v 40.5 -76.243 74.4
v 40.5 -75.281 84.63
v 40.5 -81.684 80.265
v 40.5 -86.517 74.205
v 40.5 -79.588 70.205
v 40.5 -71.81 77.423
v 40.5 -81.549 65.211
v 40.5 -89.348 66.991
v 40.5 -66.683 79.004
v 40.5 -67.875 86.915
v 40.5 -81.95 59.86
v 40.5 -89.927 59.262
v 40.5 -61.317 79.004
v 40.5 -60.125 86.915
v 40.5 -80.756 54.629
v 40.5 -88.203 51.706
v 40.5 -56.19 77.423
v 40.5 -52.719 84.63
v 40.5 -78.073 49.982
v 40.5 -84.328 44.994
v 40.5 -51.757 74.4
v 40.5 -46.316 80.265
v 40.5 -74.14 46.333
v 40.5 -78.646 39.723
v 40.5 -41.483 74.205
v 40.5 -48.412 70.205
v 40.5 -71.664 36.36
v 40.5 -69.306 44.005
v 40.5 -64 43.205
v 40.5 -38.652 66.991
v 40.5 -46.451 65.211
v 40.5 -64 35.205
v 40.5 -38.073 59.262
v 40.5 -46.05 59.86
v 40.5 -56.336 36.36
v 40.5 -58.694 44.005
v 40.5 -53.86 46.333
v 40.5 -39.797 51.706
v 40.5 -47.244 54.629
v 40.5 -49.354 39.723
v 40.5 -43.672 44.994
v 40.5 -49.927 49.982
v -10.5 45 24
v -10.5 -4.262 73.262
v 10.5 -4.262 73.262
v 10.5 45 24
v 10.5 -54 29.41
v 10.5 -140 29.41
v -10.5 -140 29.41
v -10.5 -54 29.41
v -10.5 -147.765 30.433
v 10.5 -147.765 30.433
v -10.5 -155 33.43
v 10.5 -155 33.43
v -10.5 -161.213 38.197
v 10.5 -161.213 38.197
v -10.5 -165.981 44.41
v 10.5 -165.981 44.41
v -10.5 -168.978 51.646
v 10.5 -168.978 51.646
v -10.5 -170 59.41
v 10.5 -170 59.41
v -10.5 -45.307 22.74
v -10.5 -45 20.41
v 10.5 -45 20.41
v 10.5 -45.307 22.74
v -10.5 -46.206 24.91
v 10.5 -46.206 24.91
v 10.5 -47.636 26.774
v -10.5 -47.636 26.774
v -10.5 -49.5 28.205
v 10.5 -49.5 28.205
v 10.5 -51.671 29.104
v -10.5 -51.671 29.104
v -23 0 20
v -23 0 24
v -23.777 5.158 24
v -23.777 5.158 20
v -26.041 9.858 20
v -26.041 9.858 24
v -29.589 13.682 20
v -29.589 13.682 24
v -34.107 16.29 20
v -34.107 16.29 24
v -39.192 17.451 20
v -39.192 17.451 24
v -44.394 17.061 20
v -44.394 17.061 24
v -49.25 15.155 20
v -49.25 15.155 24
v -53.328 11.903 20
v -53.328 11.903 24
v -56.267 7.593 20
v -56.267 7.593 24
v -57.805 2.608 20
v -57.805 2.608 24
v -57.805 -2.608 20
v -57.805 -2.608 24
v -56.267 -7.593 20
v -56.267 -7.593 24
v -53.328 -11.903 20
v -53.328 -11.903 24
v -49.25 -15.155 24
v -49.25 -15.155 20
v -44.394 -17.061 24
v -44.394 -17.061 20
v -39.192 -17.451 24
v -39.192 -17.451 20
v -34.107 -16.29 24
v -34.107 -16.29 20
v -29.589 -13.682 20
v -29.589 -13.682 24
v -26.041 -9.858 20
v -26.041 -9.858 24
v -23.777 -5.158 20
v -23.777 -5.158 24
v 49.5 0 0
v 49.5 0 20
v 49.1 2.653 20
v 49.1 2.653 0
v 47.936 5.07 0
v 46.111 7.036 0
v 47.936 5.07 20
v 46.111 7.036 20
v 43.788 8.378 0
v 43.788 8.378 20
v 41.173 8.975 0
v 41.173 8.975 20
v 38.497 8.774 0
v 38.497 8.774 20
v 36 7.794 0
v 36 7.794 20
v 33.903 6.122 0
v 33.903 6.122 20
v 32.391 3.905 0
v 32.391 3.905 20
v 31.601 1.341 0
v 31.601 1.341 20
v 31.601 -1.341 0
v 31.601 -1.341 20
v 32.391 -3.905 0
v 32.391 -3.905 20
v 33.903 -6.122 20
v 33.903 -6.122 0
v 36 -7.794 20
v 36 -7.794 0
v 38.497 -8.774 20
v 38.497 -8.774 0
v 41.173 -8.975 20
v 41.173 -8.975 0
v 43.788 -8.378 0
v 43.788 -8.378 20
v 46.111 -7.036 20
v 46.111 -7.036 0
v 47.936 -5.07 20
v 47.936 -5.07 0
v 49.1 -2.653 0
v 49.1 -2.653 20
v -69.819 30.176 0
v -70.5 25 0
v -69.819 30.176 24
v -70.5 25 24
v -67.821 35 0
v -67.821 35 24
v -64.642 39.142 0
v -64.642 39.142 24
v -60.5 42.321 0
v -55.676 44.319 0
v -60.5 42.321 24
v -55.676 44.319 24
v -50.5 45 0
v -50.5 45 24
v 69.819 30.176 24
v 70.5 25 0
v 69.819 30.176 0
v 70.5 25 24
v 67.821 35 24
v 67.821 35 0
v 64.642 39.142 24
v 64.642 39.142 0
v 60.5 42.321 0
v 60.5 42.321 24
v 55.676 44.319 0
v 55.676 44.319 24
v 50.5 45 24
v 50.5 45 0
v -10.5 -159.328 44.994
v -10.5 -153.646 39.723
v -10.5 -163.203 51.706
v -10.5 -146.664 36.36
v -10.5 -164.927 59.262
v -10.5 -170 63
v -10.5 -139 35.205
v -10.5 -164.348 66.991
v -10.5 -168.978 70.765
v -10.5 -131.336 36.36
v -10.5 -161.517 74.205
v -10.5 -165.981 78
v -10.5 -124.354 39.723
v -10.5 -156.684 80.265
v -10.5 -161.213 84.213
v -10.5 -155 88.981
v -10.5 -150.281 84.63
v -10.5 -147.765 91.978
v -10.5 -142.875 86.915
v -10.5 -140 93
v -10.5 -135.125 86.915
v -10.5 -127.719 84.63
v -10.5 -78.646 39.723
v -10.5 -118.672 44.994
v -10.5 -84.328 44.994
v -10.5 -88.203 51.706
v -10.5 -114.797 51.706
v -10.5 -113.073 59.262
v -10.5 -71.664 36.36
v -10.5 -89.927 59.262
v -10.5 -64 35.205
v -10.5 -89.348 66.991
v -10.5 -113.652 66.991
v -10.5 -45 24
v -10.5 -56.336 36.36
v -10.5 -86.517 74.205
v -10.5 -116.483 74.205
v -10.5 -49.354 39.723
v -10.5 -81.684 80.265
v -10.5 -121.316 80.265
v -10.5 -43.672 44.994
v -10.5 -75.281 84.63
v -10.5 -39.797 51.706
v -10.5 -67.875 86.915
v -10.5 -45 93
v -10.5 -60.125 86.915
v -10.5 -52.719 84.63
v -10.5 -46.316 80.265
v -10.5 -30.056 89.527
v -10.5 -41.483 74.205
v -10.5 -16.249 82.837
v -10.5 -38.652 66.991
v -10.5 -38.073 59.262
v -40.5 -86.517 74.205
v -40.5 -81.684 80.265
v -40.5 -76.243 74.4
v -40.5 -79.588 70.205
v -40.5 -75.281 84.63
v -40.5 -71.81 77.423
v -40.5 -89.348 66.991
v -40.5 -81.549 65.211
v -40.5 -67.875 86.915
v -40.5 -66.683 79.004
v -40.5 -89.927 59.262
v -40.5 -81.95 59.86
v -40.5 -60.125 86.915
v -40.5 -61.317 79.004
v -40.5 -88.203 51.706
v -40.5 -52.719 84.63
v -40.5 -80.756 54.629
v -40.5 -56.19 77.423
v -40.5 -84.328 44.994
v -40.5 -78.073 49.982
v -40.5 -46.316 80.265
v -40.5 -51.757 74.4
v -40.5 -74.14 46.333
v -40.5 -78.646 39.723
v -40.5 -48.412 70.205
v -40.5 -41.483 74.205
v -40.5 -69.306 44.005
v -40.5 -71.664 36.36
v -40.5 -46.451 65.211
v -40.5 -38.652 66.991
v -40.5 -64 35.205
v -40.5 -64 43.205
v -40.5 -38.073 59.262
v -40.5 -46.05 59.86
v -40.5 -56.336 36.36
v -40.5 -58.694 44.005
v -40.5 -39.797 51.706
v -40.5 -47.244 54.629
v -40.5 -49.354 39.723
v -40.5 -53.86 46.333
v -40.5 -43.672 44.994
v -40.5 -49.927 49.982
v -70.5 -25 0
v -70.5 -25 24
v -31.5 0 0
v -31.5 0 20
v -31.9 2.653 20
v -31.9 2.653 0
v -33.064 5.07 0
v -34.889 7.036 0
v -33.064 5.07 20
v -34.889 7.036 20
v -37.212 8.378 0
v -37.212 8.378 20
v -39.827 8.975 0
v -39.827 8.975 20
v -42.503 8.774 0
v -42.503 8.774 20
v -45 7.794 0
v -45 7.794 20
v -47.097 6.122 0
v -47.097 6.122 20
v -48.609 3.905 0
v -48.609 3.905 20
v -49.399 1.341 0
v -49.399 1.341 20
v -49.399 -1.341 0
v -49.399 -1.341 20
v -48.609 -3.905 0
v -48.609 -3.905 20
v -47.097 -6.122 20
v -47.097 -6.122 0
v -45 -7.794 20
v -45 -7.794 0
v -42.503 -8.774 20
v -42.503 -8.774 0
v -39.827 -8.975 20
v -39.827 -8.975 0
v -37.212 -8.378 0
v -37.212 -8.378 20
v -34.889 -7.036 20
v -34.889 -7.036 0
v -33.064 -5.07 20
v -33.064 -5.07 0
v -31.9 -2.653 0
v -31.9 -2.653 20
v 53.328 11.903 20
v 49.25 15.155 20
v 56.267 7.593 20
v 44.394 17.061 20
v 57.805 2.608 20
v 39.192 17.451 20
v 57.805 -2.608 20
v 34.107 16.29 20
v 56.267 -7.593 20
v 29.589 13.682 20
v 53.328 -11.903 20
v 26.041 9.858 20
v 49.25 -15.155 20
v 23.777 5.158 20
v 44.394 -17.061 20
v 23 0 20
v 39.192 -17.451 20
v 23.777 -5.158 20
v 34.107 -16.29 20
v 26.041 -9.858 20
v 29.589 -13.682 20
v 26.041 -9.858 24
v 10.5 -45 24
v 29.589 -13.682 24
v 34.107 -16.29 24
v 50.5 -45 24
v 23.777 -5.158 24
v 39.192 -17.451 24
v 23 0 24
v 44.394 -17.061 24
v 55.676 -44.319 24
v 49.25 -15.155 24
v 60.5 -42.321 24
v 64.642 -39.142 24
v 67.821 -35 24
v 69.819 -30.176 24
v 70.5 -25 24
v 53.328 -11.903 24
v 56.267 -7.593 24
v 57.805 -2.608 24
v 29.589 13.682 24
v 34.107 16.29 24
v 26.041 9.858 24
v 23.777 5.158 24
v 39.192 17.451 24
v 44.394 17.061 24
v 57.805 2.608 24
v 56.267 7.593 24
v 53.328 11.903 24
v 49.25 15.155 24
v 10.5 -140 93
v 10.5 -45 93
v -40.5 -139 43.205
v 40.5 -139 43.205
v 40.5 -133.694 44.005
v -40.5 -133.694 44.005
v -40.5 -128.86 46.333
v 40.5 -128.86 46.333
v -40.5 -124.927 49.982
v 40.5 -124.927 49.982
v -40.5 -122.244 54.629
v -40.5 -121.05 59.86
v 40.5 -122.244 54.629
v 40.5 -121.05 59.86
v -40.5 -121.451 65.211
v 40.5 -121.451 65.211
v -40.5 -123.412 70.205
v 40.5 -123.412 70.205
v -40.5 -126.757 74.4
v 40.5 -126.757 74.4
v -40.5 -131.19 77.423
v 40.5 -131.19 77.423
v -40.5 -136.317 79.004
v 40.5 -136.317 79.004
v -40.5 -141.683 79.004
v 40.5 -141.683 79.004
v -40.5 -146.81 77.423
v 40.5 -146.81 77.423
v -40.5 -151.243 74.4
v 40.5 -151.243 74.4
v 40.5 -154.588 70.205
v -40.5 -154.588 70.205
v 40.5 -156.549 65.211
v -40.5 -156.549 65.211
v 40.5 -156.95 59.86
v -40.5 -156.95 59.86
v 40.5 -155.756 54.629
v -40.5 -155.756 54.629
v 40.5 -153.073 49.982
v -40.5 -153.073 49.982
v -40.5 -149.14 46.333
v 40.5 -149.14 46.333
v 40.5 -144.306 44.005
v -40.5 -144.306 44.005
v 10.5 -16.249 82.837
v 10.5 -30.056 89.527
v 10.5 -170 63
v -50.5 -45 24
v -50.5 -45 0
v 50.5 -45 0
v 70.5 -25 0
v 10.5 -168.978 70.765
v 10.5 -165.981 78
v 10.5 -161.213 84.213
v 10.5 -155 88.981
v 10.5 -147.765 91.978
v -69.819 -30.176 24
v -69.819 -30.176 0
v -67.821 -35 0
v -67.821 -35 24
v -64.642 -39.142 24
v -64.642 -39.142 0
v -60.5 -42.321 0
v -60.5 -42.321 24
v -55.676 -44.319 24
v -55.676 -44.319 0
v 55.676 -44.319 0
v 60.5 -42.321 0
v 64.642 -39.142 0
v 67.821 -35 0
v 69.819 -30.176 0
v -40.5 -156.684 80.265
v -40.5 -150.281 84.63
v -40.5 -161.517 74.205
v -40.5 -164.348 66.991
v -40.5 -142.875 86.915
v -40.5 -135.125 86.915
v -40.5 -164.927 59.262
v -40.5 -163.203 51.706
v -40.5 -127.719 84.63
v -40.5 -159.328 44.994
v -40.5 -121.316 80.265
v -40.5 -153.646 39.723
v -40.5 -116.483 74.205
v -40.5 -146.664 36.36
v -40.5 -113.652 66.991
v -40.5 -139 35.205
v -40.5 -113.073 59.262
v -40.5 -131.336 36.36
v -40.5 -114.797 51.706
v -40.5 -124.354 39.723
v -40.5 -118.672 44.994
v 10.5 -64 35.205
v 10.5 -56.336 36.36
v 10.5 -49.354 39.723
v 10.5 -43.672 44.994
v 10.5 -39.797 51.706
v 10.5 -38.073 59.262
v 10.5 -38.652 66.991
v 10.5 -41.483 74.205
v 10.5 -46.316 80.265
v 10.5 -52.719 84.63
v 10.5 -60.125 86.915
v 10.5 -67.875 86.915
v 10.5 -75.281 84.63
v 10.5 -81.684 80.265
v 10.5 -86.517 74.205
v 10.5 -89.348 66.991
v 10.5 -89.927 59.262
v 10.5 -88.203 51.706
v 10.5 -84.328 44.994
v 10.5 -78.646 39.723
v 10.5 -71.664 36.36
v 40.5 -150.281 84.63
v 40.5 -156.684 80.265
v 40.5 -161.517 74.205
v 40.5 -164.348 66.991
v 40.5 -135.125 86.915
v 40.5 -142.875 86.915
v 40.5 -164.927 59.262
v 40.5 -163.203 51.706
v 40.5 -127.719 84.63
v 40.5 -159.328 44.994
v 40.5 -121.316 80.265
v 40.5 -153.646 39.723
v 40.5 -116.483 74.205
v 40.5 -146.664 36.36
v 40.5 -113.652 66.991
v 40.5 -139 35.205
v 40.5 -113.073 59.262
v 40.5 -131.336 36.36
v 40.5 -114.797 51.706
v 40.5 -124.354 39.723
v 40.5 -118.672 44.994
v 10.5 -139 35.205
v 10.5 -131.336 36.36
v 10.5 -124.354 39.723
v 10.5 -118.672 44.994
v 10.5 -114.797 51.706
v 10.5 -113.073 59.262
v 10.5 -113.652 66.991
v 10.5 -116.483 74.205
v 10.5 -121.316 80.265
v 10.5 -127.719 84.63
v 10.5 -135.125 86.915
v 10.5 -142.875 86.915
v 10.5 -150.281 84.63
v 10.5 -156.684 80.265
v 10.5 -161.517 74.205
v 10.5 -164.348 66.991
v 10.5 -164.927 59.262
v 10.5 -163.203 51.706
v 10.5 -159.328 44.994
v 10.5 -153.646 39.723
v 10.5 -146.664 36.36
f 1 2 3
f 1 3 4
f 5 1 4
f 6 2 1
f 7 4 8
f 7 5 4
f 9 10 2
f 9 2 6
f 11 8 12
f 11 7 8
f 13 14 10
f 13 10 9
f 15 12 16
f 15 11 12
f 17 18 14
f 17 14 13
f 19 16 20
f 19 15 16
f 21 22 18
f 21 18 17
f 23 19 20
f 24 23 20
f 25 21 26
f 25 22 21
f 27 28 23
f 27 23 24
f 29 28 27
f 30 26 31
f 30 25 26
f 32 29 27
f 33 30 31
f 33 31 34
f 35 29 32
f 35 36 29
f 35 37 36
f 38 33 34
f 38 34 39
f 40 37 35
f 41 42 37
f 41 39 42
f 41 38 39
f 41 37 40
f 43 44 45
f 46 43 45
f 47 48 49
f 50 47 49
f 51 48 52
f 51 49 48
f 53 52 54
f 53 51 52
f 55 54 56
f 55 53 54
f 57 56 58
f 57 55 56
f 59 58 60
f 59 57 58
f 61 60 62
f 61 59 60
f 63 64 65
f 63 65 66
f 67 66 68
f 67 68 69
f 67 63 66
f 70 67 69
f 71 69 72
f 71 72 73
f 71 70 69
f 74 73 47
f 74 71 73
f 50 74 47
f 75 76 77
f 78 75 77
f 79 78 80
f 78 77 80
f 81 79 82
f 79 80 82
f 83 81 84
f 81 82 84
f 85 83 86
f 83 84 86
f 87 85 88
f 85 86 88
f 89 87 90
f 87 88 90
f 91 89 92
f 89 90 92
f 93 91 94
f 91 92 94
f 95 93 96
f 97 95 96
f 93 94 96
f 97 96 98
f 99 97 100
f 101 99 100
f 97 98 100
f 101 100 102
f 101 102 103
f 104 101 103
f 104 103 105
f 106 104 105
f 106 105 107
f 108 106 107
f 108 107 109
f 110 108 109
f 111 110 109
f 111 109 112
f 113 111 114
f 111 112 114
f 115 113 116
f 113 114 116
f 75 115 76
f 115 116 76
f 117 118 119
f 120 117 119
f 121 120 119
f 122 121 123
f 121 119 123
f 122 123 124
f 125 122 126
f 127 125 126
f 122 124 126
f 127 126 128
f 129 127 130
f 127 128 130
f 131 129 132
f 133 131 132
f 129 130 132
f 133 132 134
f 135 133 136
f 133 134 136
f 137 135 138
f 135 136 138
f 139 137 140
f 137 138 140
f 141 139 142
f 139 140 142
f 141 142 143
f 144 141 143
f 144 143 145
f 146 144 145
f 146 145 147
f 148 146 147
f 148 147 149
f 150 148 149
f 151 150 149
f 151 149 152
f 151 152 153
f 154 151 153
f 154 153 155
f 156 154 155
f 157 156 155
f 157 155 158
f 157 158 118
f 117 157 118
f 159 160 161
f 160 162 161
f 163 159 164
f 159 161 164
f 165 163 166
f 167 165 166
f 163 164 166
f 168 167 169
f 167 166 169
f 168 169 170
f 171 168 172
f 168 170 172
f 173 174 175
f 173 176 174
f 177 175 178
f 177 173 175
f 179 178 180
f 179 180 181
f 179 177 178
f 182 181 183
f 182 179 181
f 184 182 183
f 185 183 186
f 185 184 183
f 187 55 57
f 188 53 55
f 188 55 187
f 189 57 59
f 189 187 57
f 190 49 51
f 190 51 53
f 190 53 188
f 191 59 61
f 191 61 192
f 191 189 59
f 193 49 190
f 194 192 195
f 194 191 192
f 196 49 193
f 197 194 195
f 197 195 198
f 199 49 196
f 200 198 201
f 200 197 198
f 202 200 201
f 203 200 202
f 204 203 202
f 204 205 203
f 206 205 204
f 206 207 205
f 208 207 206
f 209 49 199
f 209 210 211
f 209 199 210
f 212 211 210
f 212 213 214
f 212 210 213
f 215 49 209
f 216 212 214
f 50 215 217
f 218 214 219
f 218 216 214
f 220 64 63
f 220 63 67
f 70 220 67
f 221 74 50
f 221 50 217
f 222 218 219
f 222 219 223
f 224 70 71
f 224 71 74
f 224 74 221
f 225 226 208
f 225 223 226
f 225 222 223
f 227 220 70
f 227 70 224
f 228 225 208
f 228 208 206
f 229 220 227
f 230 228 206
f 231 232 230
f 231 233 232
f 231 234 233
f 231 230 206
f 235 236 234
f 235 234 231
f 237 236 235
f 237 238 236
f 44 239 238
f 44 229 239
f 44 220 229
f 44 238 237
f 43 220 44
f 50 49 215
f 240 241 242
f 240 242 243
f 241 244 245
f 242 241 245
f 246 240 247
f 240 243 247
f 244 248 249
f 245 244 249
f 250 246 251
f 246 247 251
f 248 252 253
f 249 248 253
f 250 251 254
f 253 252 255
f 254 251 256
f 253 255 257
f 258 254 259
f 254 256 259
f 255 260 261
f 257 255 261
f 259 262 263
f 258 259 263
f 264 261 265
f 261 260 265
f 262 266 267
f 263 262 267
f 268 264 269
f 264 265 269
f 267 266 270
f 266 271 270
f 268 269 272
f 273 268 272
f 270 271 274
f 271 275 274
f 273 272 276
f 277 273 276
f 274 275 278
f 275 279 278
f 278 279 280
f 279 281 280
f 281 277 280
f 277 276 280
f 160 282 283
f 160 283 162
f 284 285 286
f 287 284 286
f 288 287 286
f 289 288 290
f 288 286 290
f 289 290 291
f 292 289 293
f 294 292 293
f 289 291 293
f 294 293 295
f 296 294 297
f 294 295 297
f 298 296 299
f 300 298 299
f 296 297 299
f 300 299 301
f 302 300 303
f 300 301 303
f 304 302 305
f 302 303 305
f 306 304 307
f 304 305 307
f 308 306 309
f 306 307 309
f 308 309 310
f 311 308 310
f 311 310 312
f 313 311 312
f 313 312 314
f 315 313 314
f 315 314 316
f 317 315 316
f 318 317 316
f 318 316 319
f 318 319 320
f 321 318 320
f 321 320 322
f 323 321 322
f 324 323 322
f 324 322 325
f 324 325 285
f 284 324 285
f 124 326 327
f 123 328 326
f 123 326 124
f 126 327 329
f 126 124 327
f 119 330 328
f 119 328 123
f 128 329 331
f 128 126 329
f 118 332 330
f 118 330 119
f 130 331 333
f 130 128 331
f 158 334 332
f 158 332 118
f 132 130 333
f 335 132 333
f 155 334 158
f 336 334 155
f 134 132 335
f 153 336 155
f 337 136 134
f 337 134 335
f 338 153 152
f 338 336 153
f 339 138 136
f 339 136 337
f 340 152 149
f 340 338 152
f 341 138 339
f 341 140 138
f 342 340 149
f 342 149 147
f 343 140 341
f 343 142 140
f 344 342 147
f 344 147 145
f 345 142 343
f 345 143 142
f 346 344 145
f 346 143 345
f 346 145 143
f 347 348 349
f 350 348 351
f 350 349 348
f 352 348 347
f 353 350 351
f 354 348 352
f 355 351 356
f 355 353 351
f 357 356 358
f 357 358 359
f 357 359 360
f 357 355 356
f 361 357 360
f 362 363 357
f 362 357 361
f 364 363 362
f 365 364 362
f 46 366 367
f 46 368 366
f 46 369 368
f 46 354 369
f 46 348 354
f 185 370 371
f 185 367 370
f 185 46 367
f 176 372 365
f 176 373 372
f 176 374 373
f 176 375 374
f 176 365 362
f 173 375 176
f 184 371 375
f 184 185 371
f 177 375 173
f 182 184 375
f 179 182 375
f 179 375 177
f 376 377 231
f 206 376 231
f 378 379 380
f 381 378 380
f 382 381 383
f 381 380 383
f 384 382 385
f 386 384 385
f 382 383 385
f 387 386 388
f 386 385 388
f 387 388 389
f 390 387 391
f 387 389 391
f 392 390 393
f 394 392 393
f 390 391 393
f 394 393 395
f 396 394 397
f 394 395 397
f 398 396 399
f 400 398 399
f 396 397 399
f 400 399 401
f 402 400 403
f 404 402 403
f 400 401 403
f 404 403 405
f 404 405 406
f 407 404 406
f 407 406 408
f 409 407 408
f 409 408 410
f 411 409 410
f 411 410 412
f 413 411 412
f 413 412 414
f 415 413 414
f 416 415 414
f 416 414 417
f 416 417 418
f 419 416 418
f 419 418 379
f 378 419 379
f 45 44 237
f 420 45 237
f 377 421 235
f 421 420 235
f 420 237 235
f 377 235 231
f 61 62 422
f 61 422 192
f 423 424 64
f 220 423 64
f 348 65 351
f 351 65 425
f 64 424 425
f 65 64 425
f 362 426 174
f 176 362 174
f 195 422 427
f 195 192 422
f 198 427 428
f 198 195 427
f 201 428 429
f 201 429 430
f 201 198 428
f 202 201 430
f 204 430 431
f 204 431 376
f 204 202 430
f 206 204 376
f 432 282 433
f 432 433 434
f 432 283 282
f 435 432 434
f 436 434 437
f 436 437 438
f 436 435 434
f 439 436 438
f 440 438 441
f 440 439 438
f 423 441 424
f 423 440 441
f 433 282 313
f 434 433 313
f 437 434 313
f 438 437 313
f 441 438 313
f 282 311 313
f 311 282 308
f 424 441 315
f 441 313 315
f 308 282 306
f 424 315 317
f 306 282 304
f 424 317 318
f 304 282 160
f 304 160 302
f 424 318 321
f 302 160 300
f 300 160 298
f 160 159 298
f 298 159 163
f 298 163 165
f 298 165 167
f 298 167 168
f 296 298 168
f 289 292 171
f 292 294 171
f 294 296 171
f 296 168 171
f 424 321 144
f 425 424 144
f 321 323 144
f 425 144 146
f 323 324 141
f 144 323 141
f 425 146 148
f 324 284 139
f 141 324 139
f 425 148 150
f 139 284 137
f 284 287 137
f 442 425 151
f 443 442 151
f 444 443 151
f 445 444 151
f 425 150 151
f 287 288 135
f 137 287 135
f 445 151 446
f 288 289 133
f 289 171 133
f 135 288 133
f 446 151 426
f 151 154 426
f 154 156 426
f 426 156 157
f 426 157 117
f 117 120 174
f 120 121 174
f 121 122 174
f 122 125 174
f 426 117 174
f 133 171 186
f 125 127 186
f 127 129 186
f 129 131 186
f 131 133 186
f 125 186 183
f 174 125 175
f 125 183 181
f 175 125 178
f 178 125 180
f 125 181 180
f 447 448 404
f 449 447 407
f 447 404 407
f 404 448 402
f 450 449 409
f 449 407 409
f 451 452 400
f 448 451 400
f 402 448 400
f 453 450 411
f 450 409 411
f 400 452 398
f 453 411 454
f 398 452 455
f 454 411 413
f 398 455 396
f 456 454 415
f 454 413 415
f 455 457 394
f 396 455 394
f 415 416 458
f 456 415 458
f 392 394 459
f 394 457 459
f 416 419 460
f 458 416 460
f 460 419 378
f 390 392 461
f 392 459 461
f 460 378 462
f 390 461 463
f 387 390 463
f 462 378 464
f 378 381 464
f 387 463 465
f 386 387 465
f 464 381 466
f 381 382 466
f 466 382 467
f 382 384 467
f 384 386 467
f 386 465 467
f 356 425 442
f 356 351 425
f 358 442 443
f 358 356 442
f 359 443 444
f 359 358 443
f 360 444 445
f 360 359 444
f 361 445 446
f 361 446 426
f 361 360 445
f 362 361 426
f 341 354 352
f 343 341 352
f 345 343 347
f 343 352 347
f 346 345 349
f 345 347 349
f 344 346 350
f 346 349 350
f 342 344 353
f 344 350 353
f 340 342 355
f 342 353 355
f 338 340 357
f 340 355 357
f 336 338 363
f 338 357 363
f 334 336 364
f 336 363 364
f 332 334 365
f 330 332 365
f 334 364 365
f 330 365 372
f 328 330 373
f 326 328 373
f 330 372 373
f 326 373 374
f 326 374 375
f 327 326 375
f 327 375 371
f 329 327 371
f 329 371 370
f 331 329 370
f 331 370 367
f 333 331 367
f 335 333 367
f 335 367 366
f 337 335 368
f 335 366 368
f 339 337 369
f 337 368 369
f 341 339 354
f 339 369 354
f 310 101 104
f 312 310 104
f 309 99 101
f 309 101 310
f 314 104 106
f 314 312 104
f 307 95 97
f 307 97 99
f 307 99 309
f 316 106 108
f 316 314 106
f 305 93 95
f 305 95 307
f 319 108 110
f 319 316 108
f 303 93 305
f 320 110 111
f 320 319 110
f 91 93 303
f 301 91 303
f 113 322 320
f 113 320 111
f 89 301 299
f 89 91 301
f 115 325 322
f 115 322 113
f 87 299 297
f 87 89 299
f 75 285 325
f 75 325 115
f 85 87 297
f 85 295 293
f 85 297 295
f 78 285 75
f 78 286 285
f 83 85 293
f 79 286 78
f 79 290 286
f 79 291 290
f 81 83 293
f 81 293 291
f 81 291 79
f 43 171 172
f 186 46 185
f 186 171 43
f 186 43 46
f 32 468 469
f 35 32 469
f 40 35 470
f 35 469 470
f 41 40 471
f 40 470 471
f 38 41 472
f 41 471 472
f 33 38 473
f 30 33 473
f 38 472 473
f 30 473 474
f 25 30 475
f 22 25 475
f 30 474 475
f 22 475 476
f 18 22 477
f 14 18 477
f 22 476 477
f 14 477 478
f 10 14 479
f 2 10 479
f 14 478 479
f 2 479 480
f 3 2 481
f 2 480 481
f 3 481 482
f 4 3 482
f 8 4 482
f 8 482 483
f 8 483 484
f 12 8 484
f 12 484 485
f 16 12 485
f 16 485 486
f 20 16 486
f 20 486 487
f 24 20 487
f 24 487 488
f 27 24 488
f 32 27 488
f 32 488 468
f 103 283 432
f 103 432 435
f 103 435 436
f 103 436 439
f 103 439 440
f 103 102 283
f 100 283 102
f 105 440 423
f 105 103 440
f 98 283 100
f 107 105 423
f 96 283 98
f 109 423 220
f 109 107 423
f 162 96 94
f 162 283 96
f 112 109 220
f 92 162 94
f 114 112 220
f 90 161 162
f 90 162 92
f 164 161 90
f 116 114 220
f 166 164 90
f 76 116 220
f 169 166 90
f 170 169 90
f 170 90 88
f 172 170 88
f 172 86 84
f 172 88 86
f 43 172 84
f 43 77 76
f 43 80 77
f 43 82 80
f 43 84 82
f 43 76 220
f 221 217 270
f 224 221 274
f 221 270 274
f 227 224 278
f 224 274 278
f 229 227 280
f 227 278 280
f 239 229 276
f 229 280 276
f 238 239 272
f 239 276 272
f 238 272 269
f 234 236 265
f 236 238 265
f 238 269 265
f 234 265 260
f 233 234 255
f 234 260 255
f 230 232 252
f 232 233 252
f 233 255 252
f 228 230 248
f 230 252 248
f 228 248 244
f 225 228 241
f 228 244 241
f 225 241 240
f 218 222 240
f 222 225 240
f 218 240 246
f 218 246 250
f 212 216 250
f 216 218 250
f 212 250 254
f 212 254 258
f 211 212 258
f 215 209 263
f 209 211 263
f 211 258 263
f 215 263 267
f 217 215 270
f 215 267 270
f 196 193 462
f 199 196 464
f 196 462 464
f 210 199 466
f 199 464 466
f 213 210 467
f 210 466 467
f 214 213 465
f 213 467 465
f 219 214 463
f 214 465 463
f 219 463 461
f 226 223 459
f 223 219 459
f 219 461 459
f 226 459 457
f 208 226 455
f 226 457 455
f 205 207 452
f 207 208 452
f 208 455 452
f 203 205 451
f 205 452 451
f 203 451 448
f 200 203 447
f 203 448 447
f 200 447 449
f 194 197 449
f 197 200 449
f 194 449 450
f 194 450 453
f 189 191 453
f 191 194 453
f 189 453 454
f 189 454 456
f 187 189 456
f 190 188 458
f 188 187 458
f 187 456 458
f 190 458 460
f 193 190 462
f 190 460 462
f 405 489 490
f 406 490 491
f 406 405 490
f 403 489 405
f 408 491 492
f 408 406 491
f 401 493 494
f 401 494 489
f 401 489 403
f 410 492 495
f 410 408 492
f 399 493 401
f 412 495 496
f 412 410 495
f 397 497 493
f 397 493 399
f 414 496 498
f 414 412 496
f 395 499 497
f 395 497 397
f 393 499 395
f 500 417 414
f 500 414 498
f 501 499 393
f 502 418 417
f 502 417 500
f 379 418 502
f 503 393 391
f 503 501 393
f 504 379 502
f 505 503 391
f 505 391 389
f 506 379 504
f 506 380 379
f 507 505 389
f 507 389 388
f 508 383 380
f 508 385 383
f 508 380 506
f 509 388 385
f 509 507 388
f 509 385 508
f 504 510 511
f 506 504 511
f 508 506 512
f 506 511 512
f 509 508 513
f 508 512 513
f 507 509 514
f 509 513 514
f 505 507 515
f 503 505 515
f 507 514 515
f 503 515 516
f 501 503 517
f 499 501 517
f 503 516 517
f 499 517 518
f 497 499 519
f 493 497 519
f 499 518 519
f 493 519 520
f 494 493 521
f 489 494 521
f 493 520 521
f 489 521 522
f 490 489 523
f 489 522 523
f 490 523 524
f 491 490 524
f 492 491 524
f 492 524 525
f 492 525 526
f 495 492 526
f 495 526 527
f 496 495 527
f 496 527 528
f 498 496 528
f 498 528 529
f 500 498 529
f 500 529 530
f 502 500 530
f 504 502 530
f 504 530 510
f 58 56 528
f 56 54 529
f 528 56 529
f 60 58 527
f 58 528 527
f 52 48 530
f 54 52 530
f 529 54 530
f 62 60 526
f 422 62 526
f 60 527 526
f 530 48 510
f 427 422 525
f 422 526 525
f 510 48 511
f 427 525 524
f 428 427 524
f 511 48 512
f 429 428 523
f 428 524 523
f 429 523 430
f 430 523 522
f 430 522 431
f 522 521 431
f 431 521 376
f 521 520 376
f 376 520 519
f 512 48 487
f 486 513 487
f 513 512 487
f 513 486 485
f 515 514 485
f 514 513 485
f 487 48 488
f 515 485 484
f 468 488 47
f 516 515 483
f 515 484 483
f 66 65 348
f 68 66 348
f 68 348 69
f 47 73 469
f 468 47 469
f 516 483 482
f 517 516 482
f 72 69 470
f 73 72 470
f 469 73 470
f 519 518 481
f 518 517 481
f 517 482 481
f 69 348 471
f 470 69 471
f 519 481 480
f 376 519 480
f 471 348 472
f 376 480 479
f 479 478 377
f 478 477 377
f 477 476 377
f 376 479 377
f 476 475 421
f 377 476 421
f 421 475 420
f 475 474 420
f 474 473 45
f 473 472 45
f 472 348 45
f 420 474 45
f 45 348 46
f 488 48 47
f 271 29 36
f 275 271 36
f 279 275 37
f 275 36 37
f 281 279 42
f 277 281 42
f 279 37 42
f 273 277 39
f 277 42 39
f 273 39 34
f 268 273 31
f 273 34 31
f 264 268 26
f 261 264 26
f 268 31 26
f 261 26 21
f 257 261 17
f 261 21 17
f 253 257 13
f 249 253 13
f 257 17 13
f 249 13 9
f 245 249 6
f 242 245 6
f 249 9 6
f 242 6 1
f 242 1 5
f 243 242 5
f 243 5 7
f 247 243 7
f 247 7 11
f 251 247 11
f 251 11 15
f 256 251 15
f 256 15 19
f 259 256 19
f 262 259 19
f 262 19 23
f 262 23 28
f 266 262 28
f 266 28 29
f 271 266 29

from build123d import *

# Parameters (mm, degrees)
CROQUIS2_W                   = 141
CROQUIS2_H                   = 90
SALIENTE_EXTRUIR1_DEPTH      = 24
REDONDEO1_R                  = 20
CROQUIS3_R                   = 17.5
CORTAR_EXTRUIR1_DEPTH        = 4
CROQUIS5_W                   = 21
CROQUIS5_H                   = 90
SALIENTE_EXTRUIR2_DEPTH      = 69
CHAFL_N1_SIZE                = 69
REDONDEO4_R                  = 69
CROQUIS10_W                  = 21
CROQUIS10_H                  = 63.589544636
SALIENTE_EXTRUIR6_DEPTH      = 125
REDONDEO6_R                  = 9
REDONDEO7_R                  = 30
SALIENTE_EXTRUIR8_DEPTH      = 30
SALIENTE_EXTRUIR8_DEPTH_BACK = 51
CROQUIS11_R                  = 26
CROQUIS15_R                  = 18
CORTAR_EXTRUIR3_DEPTH        = 224.315919719
CROQUIS16_R                  = 18
CORTAR_EXTRUIR4_DEPTH        = 224.315919719
CROQUIS17_R                  = 9
CORTAR_EXTRUIR5_DEPTH        = 30
CROQUIS18_R                  = 9
CORTAR_EXTRUIR6_DEPTH        = 30


with BuildPart() as part:
    # Croquis2 → Saliente-Extruir1 (new body)
    with BuildSketch(Plane.XY):
        Rectangle(CROQUIS2_W, CROQUIS2_H)
    extrude(amount=SALIENTE_EXTRUIR1_DEPTH)

    # Redondeo1
    redondeo1_edges = [part.edges().sort_by_distance(p)[0] for p in [
        (70.5, -45, 12),
        (-70.5, -45, 12),
        (-70.5, 45, 12),
        (70.5, 45, 12),
    ]]
    fillet(redondeo1_edges, radius=REDONDEO1_R)

    # Croquis3 → Cortar-Extruir1 (cut)
    with BuildSketch(Plane.XY.offset(24)):
        with Locations((-40.5, 0)):
            Circle(CROQUIS3_R)
        with Locations(Location((40.5, 0, 0), (0, 0, 180))):
            Circle(CROQUIS3_R)
    extrude(amount=-CORTAR_EXTRUIR1_DEPTH, mode=Mode.SUBTRACT)

    # Croquis5 → Saliente-Extruir2 (add)
    with BuildSketch(Plane.XY.offset(24)):
        Rectangle(CROQUIS5_W, CROQUIS5_H)
    extrude(amount=SALIENTE_EXTRUIR2_DEPTH)

    # Chaflán1
    chafl_n1_edges = [part.edges().sort_by_distance(p)[0] for p in [
        (0, 45, 93),
    ]]
    chamfer(chafl_n1_edges, length=CHAFL_N1_SIZE)

    # Redondeo4
    # the kernel refuses this fillet: 69 mm, written as the material it takes off along each edge
    with BuildSketch(Plane(origin=(-80.285016103, -24, 93), x_dir=(0, 0.7071067811865477, -0.7071067811865474), z_dir=(1, 0, 0))) as redondeo4_piece_1:
        with BuildLine():
            CenterArc((27.914006441, -69), REDONDEO4_R, 90, 38.298408264)
            Line((-14.849242405, -14.849242405), (-15.704507382, -13.766227253))
            ThreePointArc((-15.704507382, -13.766227253), (-8.40042856, -6.448813844), (-0.975807358, 0.975807358))
            Line((-0.975807358, 0.975807358), (0, 1.38))
            Line((0, 1.38), (27.914006441, 1.38))
            Line((27.914006441, 1.38), (27.914006441, 0))
        make_face()
    extrude(amount=160.570032206, mode=Mode.SUBTRACT)

    # Croquis10 → Saliente-Extruir6 (add)
    with BuildSketch(Plane(origin=(0, -45, 0), x_dir=(-1, 0, 0), z_dir=(0, -1, 0))):
        with Locations((0, -61.205227682)):
            Rectangle(CROQUIS10_W, CROQUIS10_H)
    extrude(amount=SALIENTE_EXTRUIR6_DEPTH)

    # Redondeo6
    # the kernel refuses this fillet: 9 mm, written as the material it adds along each edge
    with BuildSketch(Plane(origin=(-10.5, -45, 29.410455364), x_dir=(0, 0, -1), z_dir=(1, 0, 0))) as redondeo6_piece_1:
        with BuildLine():
            CenterArc((REDONDEO6_R, -REDONDEO6_R), REDONDEO6_R, 90, 90)
            Line((0, -REDONDEO6_R), (0, 0))
            Line((0, 0), (REDONDEO6_R, 0))
        make_face()
    extrude(amount=21)

    # Redondeo7
    redondeo7_edges = [part.edges().sort_by_distance(p)[0] for p in [
        (0, -170, 93),
        (0, -170, 29.410455364),
    ]]
    fillet(redondeo7_edges, radius=REDONDEO7_R)

    # Croquis11 → Saliente-Extruir8 (add, two sides: drawn at the far end of the back side and taken through both)
    with BuildSketch(Plane(origin=(10.5, 0, 0), x_dir=(0, 0, -1), z_dir=(1, 0, 0)).offset(-SALIENTE_EXTRUIR8_DEPTH_BACK)):
        with Locations((-61.205227682, -64)):
            Circle(CROQUIS11_R)
        with Locations((-61.205227682, -139)):
            Circle(CROQUIS11_R)
    extrude(amount=SALIENTE_EXTRUIR8_DEPTH + SALIENTE_EXTRUIR8_DEPTH_BACK)

    # Croquis15 → Cortar-Extruir3 (cut, through all)
    with BuildSketch(Plane(origin=(40.5, 0, 0), x_dir=(0, 0, -1), z_dir=(1, 0, 0))):
        with Locations((-61.205227682, -64)):
            Circle(CROQUIS15_R)
    extrude(amount=-CORTAR_EXTRUIR3_DEPTH, mode=Mode.SUBTRACT)

    # Croquis16 → Cortar-Extruir4 (cut, through all)
    with BuildSketch(Plane(origin=(40.5, 0, 0), x_dir=(0, 0, -1), z_dir=(1, 0, 0))):
        with Locations((-61.205227682, -139)):
            Circle(CROQUIS16_R)
    extrude(amount=-CORTAR_EXTRUIR4_DEPTH, mode=Mode.SUBTRACT)

    # Croquis17 → Cortar-Extruir5 (cut)
    with BuildSketch(Plane.XY.offset(20)):
        with Locations((40.5, 0)):
            Circle(CROQUIS17_R)
    extrude(amount=-CORTAR_EXTRUIR5_DEPTH, mode=Mode.SUBTRACT)

    # Croquis18 → Cortar-Extruir6 (cut)
    with BuildSketch(Plane.XY.offset(20)):
        with Locations((-40.5, 0)):
            Circle(CROQUIS18_R)
    extrude(amount=-CORTAR_EXTRUIR6_DEPTH, mode=Mode.SUBTRACT)


solid = part.part
